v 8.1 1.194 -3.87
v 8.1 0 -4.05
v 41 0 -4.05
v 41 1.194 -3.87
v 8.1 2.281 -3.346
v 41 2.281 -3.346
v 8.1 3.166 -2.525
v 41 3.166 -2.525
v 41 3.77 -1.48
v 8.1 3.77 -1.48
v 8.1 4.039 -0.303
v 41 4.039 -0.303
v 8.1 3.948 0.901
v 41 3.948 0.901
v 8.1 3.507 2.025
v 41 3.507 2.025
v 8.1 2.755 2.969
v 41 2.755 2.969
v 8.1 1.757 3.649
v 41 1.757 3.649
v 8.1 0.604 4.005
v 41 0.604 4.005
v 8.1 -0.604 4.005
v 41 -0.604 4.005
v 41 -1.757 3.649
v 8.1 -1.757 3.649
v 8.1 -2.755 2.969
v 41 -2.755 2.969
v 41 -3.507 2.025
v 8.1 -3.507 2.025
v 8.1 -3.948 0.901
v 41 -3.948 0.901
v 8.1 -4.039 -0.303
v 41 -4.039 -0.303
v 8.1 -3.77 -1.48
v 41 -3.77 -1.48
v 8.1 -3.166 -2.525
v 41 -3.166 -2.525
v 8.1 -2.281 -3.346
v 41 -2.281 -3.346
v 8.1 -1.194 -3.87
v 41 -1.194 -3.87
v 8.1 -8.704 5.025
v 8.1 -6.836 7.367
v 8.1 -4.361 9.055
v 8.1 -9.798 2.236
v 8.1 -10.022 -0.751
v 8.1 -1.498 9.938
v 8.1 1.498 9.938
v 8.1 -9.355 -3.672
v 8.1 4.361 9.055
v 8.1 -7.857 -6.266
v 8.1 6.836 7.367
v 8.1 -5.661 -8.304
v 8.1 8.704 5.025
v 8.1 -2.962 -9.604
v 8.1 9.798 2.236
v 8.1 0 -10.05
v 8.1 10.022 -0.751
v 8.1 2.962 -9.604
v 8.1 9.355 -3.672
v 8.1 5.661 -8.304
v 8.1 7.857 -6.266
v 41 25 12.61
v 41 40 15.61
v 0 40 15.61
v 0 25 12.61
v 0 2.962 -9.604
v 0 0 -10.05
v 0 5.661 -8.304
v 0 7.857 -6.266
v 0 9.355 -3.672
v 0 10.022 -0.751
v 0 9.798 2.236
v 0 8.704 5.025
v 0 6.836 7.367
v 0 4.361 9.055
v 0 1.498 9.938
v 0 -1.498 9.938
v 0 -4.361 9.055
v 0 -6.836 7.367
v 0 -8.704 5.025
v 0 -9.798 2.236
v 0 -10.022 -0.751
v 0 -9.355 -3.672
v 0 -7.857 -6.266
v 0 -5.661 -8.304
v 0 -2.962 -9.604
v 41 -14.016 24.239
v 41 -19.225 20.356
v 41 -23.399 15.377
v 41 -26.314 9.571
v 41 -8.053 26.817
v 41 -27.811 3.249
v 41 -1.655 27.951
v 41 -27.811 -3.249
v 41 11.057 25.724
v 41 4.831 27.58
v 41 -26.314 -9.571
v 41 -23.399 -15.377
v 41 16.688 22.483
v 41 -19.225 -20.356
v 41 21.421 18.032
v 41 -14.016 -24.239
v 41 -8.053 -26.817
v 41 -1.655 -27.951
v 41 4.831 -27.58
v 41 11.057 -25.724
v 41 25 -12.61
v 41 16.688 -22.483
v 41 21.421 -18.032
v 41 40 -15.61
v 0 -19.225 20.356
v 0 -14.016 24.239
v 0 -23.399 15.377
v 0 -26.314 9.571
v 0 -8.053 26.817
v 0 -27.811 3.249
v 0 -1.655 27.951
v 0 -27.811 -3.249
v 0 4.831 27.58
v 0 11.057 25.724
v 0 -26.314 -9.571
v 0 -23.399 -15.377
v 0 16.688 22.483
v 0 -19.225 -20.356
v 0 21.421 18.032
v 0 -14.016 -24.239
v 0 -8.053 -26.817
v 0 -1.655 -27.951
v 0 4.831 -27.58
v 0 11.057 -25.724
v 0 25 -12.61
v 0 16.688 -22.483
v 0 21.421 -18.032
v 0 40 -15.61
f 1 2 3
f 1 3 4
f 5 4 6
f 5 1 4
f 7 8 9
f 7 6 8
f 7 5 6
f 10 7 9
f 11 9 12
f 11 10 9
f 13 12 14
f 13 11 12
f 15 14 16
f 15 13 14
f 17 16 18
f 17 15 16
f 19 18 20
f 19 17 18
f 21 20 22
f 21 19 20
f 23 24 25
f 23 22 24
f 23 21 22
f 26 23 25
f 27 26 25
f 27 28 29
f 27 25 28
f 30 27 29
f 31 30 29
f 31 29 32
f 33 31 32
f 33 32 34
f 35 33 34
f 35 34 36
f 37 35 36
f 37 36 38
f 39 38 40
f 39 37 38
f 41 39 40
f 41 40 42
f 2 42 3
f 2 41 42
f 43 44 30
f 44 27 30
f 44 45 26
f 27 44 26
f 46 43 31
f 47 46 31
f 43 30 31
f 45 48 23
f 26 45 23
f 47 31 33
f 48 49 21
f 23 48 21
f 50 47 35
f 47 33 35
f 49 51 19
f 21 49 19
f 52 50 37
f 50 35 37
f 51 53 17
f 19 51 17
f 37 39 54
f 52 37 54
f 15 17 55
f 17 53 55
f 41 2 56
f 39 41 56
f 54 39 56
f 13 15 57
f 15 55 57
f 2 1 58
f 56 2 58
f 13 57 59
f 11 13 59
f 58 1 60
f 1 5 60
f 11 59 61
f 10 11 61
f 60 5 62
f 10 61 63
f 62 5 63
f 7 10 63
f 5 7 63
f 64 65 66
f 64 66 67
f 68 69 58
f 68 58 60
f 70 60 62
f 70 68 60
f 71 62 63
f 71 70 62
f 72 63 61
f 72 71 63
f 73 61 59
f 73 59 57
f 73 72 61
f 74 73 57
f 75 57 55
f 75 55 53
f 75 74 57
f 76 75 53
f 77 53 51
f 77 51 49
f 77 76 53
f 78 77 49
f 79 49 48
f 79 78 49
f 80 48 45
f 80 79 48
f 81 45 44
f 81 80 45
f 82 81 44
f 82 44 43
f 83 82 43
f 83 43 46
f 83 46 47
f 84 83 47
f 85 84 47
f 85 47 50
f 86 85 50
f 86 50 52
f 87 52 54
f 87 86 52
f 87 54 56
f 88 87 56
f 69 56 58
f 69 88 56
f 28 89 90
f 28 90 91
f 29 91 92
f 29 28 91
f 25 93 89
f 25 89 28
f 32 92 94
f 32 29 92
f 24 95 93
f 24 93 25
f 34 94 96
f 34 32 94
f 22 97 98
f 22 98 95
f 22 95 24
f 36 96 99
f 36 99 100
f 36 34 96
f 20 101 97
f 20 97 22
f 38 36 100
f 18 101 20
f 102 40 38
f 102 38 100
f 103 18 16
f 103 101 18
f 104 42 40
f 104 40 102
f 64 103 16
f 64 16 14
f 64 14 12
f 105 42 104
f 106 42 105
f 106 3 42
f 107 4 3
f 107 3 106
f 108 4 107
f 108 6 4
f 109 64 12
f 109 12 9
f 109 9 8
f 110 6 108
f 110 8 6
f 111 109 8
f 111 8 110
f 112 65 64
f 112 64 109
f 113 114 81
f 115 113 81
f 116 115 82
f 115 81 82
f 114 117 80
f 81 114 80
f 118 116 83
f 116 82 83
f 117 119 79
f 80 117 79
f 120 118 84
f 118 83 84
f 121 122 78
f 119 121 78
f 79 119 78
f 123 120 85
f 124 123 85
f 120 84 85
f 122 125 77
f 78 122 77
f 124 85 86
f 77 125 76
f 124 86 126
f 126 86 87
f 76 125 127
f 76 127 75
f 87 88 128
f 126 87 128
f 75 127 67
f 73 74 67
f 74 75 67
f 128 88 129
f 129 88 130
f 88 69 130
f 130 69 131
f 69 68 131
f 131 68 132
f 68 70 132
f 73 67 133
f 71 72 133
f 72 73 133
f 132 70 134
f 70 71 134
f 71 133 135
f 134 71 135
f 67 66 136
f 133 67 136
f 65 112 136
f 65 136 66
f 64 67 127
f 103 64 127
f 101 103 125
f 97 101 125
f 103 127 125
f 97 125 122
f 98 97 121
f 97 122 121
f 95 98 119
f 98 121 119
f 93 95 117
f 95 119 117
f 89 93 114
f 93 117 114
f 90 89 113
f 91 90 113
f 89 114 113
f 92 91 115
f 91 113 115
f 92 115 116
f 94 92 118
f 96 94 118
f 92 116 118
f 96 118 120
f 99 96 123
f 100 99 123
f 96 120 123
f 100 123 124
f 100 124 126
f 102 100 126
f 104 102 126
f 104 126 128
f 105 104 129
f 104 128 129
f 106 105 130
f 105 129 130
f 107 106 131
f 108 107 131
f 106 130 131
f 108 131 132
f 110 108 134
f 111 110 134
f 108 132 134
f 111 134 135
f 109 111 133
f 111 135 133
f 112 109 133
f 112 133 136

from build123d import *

# Parameters (mm, degrees)
BOSS_EXTRUDE1_DEPTH = 41
SKETCH2_R           = 10.05
CUT_EXTRUDE1_DEPTH  = 8.1
SKETCH3_R           = 4.05
CUT_EXTRUDE2_DEPTH  = 64.757352517


with BuildPart() as part:
    # Sketch1 → Boss-Extrude1 (new body)
    with BuildSketch(Plane(origin=(0, 0, 0), x_dir=(0, 0, -1), z_dir=(1, 0, 0))):
        with BuildLine():
            Line((-15.609520213, 40), (-12.609520213, 25))
            ThreePointArc((-12.609520213, 25), (0, -28), (12.609520213, 25))
            Line((12.609520213, 25), (15.609520213, 40))
            Line((15.609520213, 40), (-15.609520213, 40))
        make_face()
    extrude(amount=BOSS_EXTRUDE1_DEPTH)

    # Sketch2 → Cut-Extrude1 (cut)
    with BuildSketch(Plane(origin=(0, 0, 0), x_dir=(0, 0, -1), z_dir=(1, 0, 0))):
        Circle(SKETCH2_R)
    extrude(amount=CUT_EXTRUDE1_DEPTH, mode=Mode.SUBTRACT)

    # Sketch3 → Cut-Extrude2 (cut, through all)
    with BuildSketch(Plane(origin=(0, 0, 0), x_dir=(0, 0, -1), z_dir=(1, 0, 0))):
        Circle(SKETCH3_R)
    extrude(amount=CUT_EXTRUDE2_DEPTH, mode=Mode.SUBTRACT)


solid = part.part
